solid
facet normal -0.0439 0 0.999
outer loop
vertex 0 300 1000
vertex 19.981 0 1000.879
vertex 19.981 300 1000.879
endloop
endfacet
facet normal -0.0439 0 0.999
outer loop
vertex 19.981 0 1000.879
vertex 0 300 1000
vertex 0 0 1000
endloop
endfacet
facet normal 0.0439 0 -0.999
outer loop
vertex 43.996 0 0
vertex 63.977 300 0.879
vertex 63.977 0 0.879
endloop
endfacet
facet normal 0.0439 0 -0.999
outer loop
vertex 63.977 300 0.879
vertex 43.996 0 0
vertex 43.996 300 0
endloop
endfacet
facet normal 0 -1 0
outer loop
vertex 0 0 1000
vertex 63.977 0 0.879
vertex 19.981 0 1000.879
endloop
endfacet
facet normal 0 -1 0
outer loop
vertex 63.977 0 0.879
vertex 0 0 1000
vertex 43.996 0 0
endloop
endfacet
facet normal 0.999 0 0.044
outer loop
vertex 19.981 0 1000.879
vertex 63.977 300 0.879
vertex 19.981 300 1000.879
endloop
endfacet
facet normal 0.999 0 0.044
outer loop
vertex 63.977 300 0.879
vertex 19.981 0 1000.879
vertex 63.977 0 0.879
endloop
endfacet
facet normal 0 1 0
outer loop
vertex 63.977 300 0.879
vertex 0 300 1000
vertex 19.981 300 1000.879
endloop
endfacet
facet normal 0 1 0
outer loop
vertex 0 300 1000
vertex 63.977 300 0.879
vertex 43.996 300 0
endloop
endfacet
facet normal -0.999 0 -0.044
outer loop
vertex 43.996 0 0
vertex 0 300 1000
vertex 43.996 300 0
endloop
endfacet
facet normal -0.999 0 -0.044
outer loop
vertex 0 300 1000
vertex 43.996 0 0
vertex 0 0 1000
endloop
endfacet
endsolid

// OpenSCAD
union() {
	translate(v = [43.9958912772, 0.0000000000, 0.0000000000]) {
		rotate(a = 2.5191543336, v = [0.0000000000, -0.0439533729, 0.0000000000]) {
			cube(size = [20, 300, 1000.9673513403]);
		}
	}
}
